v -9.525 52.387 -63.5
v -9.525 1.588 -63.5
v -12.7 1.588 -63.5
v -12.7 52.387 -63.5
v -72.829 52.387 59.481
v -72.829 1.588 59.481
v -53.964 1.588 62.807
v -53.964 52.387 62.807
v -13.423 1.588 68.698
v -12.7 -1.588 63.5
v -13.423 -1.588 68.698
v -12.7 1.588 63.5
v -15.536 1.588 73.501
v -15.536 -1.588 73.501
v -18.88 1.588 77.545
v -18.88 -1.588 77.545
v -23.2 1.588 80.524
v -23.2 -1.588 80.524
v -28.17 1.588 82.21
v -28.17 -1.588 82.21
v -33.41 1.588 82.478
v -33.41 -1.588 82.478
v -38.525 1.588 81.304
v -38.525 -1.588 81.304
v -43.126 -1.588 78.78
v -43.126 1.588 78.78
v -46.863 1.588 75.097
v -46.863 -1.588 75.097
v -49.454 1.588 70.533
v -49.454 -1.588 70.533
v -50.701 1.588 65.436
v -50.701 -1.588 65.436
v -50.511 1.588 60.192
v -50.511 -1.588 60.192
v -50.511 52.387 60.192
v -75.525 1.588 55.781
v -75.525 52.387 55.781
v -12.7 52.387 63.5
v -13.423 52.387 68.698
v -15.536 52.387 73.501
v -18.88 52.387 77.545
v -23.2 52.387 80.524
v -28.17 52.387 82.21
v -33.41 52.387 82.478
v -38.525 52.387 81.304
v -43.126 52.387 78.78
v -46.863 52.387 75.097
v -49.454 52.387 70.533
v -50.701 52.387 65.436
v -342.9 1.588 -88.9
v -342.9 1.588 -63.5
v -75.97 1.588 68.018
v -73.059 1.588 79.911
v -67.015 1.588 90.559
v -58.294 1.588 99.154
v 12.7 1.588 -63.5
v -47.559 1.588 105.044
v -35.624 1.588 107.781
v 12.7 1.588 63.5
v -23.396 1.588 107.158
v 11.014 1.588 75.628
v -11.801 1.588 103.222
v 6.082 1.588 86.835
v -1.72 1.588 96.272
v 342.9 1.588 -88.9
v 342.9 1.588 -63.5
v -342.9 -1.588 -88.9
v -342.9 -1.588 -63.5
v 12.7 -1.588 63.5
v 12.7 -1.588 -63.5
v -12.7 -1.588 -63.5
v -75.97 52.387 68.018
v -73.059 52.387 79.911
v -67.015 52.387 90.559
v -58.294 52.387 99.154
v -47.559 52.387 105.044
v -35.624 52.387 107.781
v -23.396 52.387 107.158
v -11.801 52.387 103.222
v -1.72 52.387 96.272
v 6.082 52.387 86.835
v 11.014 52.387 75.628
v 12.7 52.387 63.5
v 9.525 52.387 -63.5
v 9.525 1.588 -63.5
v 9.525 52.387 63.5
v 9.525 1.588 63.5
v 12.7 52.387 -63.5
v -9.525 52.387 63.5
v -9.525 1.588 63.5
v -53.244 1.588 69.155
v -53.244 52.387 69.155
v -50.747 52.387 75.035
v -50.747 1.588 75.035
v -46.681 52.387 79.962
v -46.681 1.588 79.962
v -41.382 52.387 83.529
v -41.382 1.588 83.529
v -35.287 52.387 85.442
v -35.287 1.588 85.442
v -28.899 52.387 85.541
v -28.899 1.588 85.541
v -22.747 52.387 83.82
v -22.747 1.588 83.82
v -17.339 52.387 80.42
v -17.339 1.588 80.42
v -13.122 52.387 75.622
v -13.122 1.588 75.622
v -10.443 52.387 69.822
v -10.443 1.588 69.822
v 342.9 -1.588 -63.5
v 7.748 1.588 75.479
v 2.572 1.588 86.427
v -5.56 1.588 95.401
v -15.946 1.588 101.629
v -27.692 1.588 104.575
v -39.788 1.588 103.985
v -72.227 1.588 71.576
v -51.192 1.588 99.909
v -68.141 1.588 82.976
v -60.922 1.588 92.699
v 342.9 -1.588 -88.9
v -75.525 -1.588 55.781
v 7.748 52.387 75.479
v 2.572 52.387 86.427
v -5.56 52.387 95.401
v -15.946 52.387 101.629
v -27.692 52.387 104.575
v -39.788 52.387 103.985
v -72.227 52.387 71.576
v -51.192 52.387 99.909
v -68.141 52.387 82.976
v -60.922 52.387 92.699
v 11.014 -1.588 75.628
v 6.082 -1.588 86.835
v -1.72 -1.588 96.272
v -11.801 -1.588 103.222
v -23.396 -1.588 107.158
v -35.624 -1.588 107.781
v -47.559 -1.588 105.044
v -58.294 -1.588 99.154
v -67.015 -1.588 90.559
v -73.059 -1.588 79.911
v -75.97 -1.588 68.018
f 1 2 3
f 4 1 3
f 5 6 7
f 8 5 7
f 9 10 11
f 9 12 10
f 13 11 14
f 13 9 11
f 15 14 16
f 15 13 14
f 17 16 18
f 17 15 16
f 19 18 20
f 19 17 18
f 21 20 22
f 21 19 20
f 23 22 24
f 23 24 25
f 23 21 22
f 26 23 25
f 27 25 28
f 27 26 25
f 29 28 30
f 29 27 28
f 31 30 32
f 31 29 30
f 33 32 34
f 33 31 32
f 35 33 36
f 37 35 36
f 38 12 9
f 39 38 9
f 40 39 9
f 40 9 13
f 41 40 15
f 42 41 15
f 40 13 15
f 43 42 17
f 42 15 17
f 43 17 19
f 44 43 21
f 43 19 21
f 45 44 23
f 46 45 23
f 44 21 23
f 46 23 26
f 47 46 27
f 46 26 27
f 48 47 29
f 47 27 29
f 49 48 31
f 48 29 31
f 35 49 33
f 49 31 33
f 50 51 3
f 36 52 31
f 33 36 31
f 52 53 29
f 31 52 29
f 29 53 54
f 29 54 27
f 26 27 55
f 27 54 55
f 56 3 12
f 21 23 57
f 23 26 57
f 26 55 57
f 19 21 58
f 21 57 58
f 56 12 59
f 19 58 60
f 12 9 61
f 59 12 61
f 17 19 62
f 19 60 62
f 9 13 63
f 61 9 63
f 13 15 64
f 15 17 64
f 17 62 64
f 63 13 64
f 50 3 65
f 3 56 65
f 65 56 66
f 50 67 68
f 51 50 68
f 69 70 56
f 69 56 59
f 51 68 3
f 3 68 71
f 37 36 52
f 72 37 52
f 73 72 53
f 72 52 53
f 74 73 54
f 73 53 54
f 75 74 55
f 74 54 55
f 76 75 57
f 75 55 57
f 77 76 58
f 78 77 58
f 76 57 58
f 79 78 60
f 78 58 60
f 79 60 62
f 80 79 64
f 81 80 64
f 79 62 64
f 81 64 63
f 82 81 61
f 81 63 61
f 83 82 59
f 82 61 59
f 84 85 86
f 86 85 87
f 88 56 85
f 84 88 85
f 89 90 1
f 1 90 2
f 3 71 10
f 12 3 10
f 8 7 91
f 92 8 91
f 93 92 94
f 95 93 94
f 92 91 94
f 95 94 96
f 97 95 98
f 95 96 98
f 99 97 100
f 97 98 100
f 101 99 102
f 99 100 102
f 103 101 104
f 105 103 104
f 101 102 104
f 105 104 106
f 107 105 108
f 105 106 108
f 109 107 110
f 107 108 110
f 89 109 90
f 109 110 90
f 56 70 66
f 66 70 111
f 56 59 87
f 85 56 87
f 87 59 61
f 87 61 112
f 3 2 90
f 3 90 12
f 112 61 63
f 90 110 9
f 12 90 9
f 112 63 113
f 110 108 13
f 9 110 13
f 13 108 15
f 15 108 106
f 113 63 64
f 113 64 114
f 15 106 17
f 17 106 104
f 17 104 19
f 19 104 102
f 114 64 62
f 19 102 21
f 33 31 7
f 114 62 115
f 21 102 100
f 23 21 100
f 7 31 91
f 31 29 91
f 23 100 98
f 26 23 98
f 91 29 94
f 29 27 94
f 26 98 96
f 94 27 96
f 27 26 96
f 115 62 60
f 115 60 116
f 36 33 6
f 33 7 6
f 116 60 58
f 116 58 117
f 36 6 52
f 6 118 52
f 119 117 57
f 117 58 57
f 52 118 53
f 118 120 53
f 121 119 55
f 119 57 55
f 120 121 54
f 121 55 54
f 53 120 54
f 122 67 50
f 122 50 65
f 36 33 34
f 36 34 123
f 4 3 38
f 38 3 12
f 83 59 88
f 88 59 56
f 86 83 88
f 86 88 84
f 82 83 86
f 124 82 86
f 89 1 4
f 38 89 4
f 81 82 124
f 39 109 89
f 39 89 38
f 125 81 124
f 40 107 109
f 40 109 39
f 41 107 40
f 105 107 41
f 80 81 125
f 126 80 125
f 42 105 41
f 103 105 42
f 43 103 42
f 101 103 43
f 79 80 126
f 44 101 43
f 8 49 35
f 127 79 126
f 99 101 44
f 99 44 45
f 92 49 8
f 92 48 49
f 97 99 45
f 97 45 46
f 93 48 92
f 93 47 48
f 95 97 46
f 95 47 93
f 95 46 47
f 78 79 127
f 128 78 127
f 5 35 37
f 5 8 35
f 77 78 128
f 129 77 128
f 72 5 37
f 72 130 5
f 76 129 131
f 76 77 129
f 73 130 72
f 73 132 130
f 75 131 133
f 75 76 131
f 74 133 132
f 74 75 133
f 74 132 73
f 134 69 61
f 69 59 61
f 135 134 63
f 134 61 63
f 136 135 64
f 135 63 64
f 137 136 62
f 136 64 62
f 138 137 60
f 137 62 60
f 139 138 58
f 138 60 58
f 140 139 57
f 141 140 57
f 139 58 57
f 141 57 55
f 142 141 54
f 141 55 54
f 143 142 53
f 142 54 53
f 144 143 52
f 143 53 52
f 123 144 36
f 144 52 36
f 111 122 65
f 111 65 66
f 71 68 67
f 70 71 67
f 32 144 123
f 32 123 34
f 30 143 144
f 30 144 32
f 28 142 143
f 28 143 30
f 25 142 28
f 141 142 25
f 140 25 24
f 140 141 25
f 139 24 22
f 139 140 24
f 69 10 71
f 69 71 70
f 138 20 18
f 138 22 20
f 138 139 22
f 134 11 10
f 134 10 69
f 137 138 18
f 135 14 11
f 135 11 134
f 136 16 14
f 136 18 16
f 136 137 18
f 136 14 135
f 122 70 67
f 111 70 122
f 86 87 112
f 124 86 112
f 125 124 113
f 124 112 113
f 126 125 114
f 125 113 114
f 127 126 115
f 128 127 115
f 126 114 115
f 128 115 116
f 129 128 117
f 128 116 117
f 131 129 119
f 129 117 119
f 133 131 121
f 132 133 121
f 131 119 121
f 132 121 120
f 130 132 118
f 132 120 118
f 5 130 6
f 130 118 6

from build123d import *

# Parameters (mm, degrees)
F0_W     = 25.4
F0_H     = 127
F1_DEPTH = 1.5875
F2_W     = 25.4
F2_H     = 3.175
F3_ANGLE = 190
F4_W     = 342.9
F4_H     = 25.4
F5_DEPTH = 3.175
F6_W     = 342.9
F6_H     = 25.4
F7_DEPTH = 3.175
F9_DEPTH = 50.8


with BuildPart() as f1:
    # F0 (on Front) → F1 (new body, symmetric)
    with BuildSketch(Plane.XZ):
        Rectangle(F0_W, F0_H)
    extrude(amount=F1_DEPTH, both=True)

    # F2 (on face) → F3 (revolve)
    with BuildSketch(Plane.XY.offset(63.5)):
        Rectangle(F2_W, F2_H)
    revolve(axis=Axis((-31.75, 5.55625, 63.5), (0, -1, 0)), revolution_arc=F3_ANGLE)

    # F4 (on face) → F5 (join)
    with BuildSketch(Plane.XZ.offset(1.5875)):
        with Locations((171.45, -76.2)):
            Rectangle(F4_W, F4_H)
    extrude(amount=-F5_DEPTH)

    # F6 (on face) → F7 (join)
    with BuildSketch(Plane.XZ.offset(1.5875)):
        with Locations((-171.45, -76.2)):
            Rectangle(F6_W, F6_H)
    extrude(amount=-F7_DEPTH)


with BuildPart() as f9:
    # F8 (on face) → F9 (new body)
    with BuildSketch(Plane(origin=(0, 1.5875, 0), x_dir=(-1, 0, 0), z_dir=(0, 1, 0))):
        with BuildLine():
            Line((50.510588, 60.192002), (75.524705, 55.781339))
            ThreePointArc((75.524705, 55.781339), (35.624073, 107.780854), (-12.7, 63.5))
            Line((-12.7, 63.5), (-12.7, -63.5))
            Line((-12.7, -63.5), (-9.525, -63.5))
            Line((-9.525, -63.5), (-9.525, 63.5))
            ThreePointArc((-9.525, 63.5), (33.762056, 104.725929), (72.828834, 59.480673))
            Line((72.828834, 59.480673), (53.964194, 62.807018))
            ThreePointArc((53.964194, 62.807018), (32.096533, 85.722298), (9.525, 63.5))
            Line((9.525, 63.5), (9.525, -63.5))
            Line((9.525, -63.5), (12.7, -63.5))
            Line((12.7, -63.5), (12.7, 63.5))
            ThreePointArc((12.7, 63.5), (33.410317, 82.477509), (50.510588, 60.192002))
        make_face()
    extrude(amount=F9_DEPTH)


solid = Compound([f1.part, f9.part])
